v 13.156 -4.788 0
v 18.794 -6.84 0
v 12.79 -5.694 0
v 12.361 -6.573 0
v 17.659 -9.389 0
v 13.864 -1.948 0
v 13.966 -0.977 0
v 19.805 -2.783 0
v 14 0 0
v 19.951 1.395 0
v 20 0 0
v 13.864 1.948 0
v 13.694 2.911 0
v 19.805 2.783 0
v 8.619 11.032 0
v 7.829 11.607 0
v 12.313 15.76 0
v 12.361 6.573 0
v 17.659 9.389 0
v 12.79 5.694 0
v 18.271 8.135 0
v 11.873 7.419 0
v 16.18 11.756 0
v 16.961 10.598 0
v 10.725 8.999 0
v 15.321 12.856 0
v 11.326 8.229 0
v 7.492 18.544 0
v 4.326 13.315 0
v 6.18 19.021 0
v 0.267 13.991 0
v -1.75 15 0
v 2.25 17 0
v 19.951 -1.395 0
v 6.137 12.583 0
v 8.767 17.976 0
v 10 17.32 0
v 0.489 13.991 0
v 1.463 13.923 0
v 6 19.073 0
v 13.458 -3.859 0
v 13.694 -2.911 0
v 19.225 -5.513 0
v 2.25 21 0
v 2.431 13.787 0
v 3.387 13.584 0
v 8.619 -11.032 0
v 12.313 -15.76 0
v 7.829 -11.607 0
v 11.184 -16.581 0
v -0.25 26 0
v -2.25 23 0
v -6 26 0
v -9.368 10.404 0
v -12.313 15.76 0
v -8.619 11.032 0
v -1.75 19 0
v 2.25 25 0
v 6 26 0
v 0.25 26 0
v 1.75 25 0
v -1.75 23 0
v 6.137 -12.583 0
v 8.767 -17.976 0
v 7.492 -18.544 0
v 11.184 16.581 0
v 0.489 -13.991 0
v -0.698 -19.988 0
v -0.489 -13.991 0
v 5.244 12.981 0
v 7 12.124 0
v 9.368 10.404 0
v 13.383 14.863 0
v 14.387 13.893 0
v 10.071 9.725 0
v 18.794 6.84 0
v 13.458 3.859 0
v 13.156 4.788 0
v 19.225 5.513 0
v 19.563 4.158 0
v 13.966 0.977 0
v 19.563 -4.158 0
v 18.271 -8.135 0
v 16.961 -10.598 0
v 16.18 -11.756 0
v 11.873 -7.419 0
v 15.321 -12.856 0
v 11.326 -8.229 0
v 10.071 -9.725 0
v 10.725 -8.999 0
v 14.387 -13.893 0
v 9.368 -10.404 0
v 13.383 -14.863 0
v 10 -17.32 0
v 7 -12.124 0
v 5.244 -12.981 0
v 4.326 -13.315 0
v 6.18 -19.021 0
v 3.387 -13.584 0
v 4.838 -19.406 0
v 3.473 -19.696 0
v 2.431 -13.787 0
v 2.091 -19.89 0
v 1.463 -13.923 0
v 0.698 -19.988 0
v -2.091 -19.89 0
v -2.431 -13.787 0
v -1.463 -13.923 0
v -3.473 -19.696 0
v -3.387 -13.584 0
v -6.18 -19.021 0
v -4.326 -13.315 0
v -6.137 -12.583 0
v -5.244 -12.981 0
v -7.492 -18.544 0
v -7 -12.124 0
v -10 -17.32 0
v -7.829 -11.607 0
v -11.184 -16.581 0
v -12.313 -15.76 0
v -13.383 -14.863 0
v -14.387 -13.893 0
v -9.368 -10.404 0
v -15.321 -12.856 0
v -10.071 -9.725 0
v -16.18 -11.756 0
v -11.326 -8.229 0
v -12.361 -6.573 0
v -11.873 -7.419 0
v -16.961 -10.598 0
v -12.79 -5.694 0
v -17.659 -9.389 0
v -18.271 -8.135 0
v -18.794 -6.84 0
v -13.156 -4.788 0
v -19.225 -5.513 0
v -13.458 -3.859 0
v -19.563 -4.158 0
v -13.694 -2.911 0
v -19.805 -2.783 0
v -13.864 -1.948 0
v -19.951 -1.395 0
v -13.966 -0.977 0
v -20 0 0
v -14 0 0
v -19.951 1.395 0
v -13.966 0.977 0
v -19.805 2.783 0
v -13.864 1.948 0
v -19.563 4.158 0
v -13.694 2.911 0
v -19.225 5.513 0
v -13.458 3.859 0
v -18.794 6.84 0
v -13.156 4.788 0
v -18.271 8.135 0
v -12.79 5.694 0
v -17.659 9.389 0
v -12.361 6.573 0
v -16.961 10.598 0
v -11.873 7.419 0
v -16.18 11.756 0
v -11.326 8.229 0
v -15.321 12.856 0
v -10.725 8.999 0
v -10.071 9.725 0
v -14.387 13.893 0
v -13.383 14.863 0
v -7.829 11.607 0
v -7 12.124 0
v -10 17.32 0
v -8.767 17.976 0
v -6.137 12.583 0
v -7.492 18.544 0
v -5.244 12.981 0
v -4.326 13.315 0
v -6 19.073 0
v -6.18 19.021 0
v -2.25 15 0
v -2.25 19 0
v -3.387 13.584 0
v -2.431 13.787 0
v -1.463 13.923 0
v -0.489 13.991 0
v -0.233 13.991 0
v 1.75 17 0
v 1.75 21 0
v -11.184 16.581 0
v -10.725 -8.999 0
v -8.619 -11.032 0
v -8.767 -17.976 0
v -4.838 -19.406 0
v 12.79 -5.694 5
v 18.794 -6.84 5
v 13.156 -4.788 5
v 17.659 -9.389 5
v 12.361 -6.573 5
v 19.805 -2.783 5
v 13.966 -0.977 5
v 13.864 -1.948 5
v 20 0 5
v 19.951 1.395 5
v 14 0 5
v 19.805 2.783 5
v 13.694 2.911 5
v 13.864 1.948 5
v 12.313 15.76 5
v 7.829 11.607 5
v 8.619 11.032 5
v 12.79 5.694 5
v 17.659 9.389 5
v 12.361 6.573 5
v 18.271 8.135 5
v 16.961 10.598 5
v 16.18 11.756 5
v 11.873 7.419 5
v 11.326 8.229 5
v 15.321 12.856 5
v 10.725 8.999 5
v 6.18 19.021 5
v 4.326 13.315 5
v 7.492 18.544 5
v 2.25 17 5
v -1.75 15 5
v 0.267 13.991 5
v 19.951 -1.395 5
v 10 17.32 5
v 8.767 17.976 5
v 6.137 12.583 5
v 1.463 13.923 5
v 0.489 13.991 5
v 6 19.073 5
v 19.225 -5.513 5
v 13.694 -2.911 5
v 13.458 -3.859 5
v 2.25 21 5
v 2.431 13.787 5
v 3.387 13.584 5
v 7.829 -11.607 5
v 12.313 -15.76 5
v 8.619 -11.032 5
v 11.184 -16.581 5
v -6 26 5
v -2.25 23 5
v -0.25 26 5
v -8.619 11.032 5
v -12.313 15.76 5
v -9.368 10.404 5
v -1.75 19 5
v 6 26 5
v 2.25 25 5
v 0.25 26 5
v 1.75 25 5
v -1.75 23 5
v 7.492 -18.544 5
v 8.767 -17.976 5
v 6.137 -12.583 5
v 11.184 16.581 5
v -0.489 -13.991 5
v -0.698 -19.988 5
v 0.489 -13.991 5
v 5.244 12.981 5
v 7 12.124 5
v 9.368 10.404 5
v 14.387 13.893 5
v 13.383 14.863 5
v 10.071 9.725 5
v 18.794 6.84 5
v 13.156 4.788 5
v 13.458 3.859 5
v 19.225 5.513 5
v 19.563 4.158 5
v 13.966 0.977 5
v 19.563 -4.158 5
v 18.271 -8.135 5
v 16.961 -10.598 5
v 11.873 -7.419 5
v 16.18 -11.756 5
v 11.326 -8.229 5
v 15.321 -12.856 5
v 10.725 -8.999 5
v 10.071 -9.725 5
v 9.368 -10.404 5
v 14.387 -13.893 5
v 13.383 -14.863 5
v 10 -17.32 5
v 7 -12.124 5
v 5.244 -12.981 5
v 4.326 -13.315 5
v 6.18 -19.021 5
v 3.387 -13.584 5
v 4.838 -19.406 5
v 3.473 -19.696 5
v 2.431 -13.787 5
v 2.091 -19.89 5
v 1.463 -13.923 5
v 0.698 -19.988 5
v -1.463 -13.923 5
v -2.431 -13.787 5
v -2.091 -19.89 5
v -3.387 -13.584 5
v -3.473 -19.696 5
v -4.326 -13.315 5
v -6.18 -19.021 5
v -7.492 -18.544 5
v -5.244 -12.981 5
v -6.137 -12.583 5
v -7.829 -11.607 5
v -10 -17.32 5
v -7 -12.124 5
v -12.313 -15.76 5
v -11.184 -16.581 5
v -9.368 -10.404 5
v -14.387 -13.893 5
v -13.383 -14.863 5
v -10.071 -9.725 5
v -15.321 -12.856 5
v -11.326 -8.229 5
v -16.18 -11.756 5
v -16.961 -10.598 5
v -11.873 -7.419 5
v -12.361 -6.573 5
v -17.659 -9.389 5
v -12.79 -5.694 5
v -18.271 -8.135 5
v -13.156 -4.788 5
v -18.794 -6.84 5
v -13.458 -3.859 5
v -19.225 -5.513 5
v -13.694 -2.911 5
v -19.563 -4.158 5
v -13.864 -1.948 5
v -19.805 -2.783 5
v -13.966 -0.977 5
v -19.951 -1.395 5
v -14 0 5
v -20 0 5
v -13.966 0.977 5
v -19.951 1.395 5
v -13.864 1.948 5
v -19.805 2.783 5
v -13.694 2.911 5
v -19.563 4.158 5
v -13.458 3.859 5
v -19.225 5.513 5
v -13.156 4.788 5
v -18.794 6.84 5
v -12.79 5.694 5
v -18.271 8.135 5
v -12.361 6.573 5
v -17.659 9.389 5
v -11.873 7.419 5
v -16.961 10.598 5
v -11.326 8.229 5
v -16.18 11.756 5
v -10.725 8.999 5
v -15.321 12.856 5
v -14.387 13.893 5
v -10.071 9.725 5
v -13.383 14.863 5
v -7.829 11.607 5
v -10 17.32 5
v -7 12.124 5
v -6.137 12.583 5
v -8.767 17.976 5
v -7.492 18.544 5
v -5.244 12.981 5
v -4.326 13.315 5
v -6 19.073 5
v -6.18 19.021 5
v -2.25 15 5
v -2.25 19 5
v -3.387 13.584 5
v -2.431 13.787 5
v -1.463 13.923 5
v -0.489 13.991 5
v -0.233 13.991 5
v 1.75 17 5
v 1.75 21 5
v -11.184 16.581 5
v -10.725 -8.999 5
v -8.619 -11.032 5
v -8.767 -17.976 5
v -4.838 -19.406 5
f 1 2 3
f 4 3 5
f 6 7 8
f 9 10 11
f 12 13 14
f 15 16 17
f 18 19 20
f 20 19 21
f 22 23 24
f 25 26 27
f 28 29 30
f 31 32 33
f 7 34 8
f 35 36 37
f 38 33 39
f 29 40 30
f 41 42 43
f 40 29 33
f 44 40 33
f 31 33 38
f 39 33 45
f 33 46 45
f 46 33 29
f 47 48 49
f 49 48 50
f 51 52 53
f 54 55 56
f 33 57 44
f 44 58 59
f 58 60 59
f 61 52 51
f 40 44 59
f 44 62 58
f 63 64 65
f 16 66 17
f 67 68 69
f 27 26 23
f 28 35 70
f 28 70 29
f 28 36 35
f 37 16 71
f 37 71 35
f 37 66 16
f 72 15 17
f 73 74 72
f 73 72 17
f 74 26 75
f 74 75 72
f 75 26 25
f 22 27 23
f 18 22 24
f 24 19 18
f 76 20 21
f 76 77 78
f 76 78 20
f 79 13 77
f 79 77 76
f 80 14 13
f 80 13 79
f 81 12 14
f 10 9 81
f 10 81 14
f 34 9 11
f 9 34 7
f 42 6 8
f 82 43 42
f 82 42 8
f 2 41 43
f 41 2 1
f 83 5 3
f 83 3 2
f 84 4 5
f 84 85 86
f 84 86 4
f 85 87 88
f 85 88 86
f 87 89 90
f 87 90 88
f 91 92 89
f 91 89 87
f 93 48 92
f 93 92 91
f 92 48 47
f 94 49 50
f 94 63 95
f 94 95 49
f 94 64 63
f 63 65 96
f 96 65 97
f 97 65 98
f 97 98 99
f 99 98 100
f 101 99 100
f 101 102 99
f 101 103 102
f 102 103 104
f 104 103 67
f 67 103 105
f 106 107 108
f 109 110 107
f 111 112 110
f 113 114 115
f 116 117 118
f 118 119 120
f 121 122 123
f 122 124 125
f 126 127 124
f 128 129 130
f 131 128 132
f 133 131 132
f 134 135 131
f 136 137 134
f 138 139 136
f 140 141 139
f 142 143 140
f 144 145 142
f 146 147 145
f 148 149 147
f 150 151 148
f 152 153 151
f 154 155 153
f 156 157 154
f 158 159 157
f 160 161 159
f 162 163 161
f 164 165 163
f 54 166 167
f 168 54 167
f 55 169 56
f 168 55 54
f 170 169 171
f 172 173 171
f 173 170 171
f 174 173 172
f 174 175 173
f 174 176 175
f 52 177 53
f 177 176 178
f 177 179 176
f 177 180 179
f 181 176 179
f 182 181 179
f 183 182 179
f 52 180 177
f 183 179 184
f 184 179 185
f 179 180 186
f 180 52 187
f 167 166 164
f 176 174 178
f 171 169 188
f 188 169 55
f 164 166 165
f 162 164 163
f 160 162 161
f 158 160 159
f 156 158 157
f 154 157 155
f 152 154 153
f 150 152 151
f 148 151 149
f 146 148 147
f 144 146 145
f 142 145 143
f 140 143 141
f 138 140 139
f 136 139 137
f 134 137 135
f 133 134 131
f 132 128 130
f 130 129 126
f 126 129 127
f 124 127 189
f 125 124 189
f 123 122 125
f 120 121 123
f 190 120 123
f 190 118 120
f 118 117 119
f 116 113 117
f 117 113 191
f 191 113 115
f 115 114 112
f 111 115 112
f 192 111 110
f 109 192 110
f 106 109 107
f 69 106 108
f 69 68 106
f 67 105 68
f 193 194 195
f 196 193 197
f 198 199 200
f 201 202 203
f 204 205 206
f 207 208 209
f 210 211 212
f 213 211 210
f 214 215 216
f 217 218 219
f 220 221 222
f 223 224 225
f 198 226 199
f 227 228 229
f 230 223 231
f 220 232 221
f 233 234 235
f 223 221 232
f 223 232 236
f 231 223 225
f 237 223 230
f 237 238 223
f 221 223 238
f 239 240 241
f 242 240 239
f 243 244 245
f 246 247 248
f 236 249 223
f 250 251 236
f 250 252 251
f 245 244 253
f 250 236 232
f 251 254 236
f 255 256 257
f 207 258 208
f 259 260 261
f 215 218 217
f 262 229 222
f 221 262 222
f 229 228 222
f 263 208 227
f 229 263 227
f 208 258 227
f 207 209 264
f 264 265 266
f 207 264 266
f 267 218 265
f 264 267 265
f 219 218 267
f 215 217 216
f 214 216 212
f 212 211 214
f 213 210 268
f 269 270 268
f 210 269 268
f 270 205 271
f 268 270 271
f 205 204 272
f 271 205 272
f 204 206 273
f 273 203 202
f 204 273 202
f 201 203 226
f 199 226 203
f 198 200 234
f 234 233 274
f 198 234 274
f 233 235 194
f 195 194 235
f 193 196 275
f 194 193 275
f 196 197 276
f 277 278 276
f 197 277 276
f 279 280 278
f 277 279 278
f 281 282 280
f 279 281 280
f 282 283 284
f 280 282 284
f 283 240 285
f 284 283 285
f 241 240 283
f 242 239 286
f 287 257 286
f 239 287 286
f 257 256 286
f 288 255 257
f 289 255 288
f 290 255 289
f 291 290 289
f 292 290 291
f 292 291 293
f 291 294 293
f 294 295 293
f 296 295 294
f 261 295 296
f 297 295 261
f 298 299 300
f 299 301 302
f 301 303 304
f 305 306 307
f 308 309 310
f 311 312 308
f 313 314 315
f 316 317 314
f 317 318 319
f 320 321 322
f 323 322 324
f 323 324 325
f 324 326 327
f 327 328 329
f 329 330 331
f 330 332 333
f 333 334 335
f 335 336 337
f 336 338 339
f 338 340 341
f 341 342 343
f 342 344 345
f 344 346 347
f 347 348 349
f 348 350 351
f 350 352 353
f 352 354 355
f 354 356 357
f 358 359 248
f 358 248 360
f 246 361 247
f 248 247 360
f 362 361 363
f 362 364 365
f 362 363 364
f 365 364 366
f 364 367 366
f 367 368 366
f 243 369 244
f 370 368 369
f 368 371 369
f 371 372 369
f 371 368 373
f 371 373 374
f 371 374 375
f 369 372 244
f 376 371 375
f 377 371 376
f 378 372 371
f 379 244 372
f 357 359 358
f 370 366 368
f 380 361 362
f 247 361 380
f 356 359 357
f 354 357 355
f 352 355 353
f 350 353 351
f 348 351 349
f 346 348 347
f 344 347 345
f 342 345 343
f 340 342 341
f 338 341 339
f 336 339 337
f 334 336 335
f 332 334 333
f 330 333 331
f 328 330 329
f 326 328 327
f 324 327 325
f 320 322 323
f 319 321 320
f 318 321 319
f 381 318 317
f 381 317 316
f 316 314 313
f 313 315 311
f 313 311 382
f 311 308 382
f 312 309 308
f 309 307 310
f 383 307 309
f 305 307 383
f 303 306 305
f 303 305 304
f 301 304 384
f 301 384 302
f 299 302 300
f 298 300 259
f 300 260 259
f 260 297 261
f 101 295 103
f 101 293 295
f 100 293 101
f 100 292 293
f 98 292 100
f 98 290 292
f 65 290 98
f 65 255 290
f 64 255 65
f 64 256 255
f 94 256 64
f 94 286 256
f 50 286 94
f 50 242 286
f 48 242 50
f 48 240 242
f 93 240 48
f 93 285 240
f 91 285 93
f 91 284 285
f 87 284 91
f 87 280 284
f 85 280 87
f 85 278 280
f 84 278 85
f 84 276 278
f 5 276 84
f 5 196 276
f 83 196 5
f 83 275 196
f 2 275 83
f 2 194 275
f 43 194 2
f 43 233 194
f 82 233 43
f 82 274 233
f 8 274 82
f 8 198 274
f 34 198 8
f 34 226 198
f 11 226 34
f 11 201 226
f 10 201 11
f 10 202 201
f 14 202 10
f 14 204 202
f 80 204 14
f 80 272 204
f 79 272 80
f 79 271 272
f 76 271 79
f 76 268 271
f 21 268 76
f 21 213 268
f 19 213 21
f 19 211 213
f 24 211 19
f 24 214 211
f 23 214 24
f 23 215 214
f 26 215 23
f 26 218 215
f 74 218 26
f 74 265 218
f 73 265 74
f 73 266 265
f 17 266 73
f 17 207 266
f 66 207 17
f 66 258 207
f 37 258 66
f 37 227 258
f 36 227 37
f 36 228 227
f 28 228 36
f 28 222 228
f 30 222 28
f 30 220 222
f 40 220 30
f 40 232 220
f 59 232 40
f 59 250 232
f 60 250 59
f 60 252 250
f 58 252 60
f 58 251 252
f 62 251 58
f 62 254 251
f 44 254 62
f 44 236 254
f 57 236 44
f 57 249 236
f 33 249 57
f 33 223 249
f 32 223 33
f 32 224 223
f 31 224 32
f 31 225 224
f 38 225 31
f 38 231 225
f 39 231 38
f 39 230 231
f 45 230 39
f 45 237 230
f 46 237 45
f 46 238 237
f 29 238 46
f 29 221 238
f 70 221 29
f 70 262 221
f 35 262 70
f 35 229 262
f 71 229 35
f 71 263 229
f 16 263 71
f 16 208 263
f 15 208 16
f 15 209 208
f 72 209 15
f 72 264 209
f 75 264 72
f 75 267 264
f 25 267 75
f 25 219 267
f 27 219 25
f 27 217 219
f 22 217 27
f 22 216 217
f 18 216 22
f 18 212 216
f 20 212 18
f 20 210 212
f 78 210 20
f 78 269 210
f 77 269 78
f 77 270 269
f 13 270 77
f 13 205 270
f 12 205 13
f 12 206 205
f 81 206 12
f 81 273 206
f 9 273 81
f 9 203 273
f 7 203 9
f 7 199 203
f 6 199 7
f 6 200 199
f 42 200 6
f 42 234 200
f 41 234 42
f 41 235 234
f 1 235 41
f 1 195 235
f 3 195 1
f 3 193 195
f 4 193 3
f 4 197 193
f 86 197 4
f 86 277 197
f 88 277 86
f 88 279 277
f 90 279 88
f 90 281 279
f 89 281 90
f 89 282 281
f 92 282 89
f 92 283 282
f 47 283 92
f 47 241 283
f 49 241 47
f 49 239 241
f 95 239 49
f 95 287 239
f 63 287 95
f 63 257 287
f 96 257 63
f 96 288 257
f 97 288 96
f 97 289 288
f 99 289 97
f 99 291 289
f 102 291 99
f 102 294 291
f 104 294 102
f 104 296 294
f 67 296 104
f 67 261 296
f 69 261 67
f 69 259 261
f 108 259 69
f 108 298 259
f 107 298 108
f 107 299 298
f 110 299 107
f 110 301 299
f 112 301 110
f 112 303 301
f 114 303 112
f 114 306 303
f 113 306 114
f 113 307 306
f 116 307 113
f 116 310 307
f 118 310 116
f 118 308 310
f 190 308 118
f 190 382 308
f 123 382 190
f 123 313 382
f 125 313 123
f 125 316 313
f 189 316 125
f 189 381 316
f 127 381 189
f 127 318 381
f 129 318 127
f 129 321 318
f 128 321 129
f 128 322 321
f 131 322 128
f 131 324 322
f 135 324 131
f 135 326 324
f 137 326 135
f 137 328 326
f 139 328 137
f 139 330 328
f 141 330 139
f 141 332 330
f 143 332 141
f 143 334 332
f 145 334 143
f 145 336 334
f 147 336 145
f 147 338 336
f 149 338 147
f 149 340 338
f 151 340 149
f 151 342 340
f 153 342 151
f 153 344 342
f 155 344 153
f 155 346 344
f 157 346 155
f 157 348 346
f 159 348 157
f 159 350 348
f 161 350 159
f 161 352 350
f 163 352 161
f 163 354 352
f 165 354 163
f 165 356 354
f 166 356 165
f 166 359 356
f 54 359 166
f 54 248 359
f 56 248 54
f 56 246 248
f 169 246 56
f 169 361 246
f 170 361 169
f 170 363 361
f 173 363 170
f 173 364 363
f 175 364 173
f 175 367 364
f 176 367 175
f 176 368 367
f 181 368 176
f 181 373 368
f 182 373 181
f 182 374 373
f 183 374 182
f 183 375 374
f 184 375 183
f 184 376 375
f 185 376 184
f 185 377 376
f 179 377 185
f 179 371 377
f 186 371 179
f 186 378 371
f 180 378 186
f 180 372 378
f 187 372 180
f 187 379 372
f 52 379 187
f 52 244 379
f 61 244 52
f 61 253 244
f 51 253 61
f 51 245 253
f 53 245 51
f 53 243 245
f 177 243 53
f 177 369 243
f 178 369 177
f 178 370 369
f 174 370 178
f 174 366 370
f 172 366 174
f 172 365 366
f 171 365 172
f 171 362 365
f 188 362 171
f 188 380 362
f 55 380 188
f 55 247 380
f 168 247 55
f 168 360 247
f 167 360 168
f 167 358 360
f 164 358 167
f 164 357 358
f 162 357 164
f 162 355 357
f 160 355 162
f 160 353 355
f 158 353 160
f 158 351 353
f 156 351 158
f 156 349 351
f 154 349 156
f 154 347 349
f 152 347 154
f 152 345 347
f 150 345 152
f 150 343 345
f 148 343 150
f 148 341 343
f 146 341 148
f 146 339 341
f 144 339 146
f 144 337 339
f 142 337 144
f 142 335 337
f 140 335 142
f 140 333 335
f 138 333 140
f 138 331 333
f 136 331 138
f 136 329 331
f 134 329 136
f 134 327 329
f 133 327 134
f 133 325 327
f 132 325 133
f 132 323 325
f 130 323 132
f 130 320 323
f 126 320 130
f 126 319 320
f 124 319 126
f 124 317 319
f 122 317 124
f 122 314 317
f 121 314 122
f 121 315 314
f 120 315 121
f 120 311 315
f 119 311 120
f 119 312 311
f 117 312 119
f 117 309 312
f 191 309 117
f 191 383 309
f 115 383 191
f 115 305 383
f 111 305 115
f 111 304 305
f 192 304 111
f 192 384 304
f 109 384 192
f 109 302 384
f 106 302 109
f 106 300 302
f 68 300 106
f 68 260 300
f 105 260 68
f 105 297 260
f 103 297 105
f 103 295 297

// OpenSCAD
thickness = 5;
hanger_d = 40;
hanger_width = 6;
tolerance = 0.5;
jaws_length = 12;

$fs = 0.01;
$fa = 4;
hanger_id = hanger_d - hanger_width * 2;

module zigzag(n = 3, length = 1.5, width = 2) {
	for (i = [0:n - 1]) {
		offset = i * length;
		translate([offset, -(width + tolerance) / 2]) polygon([
			[0, 0], [length / 2, width], [length, 0],
			[length, tolerance], [length / 2, width + tolerance], [0, tolerance]
		]);
	}
}

linear_extrude(thickness) {
	difference() {
		union() {
			circle(d = hanger_d);
			translate([-hanger_width, hanger_id / 2]) square([hanger_width * 2, jaws_length]);
		}
		circle(d = hanger_id);
		translate([0, hanger_id / 2 - 1]) rotate([0, 0, 90]) {
			zigzag(width = hanger_width / 3 * 2, length = hanger_width / 3 * 2, n = jaws_length / hanger_width * 2 + 1);
		}
	}
}
